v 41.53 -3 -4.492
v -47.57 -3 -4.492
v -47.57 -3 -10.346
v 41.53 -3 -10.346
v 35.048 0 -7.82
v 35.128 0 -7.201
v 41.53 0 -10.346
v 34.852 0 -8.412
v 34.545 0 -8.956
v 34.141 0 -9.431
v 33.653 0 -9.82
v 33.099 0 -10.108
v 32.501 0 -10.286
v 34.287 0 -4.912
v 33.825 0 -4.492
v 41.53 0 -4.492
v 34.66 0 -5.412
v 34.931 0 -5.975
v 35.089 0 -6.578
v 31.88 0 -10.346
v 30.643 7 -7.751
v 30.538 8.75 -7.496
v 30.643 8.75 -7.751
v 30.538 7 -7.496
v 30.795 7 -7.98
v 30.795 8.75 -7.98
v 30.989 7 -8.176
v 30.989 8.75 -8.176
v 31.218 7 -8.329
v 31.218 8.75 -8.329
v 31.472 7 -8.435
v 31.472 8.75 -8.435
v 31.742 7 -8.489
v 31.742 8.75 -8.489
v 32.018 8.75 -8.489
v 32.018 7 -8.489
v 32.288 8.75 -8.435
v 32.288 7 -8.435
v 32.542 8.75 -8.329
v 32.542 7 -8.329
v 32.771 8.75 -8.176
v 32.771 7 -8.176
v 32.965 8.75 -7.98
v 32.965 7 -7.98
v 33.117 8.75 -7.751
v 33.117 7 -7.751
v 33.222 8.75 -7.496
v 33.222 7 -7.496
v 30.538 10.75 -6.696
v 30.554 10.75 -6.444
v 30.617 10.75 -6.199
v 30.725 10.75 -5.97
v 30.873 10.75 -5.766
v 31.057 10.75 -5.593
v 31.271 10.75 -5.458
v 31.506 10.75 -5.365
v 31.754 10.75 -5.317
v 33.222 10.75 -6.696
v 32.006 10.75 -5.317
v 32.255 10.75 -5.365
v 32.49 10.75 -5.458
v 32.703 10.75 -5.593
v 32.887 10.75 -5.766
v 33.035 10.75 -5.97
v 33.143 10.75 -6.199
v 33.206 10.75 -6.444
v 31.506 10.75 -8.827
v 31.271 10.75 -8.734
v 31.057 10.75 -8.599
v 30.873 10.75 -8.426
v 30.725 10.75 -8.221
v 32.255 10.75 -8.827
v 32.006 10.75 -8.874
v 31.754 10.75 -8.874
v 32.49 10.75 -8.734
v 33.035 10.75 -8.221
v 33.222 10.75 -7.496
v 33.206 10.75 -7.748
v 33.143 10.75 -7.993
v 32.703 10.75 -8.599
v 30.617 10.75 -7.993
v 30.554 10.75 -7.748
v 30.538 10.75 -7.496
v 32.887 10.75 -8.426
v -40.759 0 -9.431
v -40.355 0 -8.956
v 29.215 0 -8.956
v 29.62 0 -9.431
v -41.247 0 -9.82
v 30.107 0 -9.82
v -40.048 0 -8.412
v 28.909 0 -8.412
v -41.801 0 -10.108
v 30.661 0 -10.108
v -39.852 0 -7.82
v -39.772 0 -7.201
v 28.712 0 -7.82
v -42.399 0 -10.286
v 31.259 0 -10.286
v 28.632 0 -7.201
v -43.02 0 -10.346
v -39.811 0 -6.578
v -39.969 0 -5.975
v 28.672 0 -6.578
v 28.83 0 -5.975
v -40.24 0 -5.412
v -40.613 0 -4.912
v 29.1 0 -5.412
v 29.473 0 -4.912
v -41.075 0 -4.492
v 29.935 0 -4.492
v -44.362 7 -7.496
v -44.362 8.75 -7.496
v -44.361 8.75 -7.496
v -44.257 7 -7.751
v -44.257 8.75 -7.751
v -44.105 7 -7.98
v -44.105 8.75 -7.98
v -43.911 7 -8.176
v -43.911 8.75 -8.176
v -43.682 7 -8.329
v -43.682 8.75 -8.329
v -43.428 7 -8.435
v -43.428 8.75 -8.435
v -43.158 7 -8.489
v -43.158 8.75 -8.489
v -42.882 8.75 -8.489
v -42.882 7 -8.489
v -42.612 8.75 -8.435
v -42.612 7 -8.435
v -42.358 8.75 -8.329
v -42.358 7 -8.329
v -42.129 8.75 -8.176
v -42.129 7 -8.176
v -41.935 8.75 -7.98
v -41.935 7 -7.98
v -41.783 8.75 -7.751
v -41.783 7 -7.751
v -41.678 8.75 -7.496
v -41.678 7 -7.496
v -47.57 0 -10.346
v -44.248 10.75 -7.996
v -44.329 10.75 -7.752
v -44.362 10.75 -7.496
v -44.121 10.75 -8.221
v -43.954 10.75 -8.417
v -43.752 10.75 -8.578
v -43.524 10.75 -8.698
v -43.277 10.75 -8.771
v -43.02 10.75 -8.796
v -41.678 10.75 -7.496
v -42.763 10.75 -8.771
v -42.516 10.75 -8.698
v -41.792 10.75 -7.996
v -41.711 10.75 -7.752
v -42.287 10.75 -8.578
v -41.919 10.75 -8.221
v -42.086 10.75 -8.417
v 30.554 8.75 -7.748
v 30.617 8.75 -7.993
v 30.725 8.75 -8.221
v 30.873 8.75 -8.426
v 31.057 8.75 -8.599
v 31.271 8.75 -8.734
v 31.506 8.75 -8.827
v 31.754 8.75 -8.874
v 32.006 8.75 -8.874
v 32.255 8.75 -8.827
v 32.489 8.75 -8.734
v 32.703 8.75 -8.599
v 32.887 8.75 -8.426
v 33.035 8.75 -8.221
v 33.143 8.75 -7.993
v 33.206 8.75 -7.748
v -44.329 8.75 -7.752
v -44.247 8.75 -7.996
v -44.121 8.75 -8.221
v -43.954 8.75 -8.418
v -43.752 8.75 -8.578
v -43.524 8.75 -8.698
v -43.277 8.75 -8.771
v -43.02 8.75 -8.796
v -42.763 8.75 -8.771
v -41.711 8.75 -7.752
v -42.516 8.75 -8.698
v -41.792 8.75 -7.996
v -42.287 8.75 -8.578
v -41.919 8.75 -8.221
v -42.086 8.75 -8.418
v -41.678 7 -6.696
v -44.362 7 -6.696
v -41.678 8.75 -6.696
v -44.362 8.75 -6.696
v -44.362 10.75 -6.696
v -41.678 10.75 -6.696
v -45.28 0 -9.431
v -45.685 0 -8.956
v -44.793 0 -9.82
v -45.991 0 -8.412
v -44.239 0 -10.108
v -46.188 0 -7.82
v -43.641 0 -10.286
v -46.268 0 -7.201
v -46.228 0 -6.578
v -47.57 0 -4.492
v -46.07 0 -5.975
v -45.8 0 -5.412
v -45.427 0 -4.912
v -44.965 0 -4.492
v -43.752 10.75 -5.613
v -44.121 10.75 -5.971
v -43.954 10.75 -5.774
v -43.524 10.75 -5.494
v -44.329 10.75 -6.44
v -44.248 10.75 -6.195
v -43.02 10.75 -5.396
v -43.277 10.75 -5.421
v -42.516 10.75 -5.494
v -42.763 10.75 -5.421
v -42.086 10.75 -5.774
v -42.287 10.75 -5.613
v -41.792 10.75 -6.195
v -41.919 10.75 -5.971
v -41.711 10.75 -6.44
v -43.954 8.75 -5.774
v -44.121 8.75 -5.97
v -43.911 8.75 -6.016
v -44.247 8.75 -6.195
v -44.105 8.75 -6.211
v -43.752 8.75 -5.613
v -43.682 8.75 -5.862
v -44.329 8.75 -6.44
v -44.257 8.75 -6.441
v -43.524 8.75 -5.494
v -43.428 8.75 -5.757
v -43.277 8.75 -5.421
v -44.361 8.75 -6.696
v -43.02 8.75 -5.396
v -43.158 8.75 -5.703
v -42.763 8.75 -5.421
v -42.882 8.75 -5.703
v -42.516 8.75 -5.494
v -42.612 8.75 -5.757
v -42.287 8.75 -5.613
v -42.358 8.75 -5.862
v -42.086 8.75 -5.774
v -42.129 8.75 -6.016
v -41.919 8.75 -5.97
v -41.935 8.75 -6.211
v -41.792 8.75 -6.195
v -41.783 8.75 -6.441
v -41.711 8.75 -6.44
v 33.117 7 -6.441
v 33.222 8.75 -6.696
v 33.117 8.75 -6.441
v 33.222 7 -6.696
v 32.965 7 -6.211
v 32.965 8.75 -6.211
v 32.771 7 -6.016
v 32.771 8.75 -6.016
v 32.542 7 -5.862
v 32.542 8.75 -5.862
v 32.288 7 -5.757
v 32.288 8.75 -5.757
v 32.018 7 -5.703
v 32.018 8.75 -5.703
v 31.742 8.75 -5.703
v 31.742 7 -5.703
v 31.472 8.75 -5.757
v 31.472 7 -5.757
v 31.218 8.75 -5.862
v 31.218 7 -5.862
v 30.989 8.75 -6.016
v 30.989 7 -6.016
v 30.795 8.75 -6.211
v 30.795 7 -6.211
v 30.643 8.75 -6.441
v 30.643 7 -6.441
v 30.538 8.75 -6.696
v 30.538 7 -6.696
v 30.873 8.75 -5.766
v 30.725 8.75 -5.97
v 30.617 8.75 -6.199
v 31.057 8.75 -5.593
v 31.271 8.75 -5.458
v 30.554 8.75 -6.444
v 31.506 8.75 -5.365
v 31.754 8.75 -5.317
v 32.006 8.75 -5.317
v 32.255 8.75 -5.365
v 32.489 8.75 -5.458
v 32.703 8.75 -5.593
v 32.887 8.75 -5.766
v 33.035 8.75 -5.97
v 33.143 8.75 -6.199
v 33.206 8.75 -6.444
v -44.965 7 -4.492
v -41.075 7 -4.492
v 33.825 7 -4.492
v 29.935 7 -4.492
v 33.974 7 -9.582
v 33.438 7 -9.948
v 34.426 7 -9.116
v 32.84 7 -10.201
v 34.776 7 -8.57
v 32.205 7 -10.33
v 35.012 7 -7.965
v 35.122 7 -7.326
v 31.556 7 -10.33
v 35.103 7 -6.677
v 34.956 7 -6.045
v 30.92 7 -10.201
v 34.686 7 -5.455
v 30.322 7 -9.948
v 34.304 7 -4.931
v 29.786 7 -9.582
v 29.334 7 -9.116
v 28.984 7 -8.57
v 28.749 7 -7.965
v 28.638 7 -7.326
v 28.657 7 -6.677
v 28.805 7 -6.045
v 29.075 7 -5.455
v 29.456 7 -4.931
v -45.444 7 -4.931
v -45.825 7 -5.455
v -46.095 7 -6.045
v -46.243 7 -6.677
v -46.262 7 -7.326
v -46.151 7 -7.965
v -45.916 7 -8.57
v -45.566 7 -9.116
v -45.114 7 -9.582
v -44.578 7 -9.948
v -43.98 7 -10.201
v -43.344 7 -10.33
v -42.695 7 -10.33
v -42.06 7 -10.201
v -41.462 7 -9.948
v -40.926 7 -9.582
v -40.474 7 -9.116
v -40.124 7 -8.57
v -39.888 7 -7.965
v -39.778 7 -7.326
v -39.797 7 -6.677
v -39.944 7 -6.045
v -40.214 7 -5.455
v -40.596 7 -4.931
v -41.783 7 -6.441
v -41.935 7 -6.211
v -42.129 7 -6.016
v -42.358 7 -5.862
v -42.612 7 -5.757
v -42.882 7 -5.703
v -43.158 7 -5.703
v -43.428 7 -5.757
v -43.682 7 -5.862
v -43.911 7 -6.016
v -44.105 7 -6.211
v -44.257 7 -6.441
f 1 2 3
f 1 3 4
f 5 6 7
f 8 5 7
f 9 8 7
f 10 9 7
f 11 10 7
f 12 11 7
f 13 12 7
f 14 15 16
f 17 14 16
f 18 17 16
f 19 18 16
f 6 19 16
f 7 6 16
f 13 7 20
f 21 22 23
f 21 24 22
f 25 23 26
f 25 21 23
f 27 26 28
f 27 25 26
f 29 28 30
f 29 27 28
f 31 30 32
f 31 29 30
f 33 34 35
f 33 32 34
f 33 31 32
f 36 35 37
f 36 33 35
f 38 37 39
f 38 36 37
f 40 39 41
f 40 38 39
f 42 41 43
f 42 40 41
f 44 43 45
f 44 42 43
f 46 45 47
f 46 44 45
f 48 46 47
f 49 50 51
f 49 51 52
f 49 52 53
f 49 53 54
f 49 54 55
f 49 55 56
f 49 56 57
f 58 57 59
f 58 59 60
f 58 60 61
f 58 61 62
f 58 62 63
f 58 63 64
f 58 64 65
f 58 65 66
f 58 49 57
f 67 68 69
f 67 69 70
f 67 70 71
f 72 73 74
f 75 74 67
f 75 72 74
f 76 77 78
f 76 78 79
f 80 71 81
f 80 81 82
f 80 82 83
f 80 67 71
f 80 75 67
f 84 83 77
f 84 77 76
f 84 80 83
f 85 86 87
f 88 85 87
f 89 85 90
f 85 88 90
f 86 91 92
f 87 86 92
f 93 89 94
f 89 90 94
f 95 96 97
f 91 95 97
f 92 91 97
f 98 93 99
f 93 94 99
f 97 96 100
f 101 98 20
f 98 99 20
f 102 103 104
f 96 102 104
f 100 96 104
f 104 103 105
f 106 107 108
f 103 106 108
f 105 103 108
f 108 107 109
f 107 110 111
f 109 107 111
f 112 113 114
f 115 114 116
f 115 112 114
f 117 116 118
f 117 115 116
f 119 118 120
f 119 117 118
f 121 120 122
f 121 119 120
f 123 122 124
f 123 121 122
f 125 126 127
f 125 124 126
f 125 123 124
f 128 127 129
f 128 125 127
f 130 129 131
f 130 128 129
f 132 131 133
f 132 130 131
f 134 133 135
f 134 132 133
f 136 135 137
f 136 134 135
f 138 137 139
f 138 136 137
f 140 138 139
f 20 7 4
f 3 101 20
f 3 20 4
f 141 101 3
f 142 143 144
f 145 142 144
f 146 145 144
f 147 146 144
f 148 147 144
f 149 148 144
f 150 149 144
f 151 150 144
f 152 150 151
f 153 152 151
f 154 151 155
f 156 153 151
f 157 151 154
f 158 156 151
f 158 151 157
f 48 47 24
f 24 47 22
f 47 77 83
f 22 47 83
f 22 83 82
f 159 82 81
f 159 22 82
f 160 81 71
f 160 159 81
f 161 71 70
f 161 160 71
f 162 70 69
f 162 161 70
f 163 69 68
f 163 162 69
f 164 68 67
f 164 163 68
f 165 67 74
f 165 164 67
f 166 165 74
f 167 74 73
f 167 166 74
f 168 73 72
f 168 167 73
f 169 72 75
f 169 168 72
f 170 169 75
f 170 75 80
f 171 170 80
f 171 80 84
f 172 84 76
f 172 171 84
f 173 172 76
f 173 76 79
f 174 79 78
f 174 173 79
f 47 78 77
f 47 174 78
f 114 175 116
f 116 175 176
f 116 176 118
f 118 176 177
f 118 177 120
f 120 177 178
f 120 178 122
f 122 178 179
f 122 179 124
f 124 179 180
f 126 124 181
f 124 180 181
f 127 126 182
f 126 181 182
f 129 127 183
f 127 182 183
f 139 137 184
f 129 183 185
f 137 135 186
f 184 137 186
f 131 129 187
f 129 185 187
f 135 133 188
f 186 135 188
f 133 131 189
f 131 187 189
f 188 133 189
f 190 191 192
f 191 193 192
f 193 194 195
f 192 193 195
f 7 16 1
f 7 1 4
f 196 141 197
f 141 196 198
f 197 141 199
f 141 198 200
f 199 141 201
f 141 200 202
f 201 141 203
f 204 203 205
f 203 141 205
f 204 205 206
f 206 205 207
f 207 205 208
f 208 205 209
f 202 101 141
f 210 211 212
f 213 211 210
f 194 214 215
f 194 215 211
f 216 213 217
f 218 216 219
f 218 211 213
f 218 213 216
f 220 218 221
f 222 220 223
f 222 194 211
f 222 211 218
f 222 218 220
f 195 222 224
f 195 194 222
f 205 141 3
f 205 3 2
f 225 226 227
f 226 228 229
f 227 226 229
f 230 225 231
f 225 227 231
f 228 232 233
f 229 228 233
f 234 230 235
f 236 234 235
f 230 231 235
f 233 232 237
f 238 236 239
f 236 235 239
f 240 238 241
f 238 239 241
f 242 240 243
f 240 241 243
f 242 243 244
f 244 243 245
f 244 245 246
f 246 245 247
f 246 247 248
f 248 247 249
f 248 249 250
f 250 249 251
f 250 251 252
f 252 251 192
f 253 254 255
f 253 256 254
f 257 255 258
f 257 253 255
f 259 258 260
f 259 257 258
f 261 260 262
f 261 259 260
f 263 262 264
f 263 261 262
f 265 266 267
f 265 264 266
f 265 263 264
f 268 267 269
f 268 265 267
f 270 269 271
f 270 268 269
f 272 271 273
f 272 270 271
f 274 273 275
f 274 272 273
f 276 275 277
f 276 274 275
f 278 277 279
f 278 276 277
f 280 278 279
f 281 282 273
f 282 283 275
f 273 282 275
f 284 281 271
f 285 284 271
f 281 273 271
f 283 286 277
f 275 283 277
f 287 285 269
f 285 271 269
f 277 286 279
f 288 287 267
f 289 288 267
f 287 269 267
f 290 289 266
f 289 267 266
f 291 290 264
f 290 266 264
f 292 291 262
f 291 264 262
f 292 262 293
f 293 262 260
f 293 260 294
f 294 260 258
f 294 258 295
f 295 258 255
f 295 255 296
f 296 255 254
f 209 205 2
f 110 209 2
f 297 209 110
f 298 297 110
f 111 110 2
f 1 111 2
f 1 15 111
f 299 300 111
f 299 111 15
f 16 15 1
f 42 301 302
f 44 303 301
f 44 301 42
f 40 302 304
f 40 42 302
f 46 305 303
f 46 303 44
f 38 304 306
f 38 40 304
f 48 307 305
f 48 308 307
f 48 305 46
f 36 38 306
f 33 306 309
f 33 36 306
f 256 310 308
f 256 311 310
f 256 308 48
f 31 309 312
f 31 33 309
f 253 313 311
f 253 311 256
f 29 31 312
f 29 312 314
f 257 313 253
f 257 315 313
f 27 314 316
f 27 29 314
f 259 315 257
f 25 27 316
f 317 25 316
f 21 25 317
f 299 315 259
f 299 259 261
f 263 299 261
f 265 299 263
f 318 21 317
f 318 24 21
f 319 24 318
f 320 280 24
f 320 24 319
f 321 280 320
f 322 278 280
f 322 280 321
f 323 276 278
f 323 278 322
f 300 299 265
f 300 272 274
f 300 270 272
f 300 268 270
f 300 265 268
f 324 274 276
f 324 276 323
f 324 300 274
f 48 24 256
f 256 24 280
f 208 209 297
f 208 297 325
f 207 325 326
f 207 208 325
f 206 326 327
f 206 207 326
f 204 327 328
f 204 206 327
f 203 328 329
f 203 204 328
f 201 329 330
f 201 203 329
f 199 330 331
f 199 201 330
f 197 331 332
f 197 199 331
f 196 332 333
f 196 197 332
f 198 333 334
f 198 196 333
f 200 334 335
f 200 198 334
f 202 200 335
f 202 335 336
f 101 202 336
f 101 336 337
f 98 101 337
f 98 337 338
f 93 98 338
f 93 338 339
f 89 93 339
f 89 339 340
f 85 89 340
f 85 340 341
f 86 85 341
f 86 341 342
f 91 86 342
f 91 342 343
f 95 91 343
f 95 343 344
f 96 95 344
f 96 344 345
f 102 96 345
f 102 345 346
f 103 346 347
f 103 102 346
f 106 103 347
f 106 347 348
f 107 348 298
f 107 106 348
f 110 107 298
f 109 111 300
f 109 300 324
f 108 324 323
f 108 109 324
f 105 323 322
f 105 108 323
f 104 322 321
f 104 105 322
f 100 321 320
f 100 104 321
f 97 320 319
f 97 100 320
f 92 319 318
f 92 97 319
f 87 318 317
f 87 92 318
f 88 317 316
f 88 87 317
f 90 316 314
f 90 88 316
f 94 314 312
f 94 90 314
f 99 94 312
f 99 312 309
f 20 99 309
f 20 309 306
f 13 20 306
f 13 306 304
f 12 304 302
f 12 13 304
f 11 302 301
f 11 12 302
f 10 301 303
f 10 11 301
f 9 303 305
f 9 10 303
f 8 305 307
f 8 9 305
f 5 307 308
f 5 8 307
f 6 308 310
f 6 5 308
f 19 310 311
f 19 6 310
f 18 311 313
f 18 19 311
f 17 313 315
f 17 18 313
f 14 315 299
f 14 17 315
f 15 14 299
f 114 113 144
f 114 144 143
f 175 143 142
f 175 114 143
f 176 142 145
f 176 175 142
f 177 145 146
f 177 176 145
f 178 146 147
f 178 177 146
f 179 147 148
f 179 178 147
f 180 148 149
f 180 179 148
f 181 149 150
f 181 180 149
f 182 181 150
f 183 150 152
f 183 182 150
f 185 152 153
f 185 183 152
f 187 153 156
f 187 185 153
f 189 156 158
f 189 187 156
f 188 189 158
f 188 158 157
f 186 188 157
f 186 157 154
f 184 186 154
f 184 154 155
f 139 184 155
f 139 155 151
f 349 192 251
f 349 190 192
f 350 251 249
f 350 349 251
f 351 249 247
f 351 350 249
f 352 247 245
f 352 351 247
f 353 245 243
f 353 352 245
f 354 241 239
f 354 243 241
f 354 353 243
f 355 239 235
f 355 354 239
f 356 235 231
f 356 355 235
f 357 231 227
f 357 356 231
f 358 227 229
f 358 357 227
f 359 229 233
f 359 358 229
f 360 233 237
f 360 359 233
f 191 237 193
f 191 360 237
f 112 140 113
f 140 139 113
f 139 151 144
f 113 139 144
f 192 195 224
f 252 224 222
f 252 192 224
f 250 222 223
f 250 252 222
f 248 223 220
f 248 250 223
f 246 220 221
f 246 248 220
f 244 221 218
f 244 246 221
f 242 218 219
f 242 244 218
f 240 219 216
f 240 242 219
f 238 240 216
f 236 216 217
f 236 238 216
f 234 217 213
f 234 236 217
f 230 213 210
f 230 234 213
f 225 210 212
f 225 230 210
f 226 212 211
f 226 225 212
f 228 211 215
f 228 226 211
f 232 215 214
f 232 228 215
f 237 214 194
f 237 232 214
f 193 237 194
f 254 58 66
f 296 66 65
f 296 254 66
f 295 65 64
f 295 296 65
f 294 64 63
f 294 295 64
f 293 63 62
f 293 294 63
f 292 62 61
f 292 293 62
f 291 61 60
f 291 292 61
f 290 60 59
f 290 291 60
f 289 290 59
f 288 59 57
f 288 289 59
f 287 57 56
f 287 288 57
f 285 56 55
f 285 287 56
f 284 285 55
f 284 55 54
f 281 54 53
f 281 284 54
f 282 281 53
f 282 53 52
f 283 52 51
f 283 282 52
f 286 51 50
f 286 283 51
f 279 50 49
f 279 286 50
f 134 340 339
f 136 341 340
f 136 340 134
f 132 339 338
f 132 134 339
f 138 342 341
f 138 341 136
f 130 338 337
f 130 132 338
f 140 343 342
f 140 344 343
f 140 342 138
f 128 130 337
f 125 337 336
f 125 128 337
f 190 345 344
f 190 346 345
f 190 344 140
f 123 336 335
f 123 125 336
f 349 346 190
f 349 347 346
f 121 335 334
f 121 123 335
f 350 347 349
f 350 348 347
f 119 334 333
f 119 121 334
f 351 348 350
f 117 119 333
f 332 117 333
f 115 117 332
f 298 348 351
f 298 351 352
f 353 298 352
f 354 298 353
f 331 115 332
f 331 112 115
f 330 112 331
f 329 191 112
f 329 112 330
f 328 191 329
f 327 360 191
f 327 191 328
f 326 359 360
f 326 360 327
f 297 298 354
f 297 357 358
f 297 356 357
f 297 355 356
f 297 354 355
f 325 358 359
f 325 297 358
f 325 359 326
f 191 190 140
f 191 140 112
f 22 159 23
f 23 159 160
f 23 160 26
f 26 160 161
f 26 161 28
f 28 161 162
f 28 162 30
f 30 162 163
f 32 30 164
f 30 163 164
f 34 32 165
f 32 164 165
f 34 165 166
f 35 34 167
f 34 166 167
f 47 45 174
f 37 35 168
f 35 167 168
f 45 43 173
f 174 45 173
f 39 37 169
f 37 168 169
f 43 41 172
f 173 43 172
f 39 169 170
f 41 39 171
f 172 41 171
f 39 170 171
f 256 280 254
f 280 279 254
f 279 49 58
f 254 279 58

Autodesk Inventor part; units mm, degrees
ref_plane "YZ Plane" through (0, 0, 0) normal (1, 0, 0) x (0, 1, 0)
ref_plane "XZ Plane" through (0, 0, 0) normal (0, 1, 0) x (-1, 0, 0)
ref_plane "XY Plane" through (0, 0, 0) normal (0, 0, 1) x (1, 0, 0)
sketch "Sketch1" plane through (0, 0, 0) normal (0, 1, 0) x (-1, 0, 0)
  circle A0 centre (43.0199, -7.0958) radius 1.25 construction
  circle A1 centre (-31.8801, -7.0958) radius 1.25 construction
  circle A2 centre (44.3199, 41.1042) radius 1.25 construction
  circle A3 centre (-38.2801, 41.1042) radius 1.25 construction
  line L0 (58.8879, -10.055) -> (-40.7911, -10.055) construction
  line L1 (-40.7911, -10.055) -> (-40.7911, 44.0634) construction
  line L2 (-40.7911, 44.0634) -> (58.8879, 44.0634) construction
  line L3 (58.8879, 44.0634) -> (58.8879, -10.055) construction
  line L4 (43.0199, -7.0958) -> (43.0199, -10.055)
  line L5 (44.3199, 41.1042) -> (44.3199, 44.0634)
  dimension "d0" = 2.5
  dimension "d1" = 74.9
  dimension "d2" = 1.3
  dimension "d3" = 48.2
  dimension "d5" = 82.6
  dimension "d9" = 15.868
  dimension "d10" = 54.1184
  dimension "d11" = 99.679
sketch "Sketch2" plane through (0, 0, 0) normal (0, 1, 0) x (-1, 0, 0)
  circle A0 centre (43.0199, -7.0958) radius 1.25 construction
  circle A1 centre (-31.8801, -7.0958) radius 1.25 construction
  circle A2 centre (-38.2801, 41.1042) radius 1.25 construction
  circle A3 centre (44.3199, 41.1042) radius 1.25 construction
  circle A4 centre (43.0199, -7.0958) radius 3.25
  circle A5 centre (-31.8801, -7.0958) radius 3.25
  circle A6 centre (-38.2801, 41.1042) radius 3.25
  circle A7 centre (44.3199, 41.1042) radius 3.25
  point P0 (0, 0)
  dimension "d6" = 2
extrude "Extrusion1" add sketch "Sketch2" along normal blind 7
sketch "Sketch3" plane through (-43.0199, 7, -7.0958) normal (0, 1, 0) x (1, 0, 0)
  circle A0 centre (0, 0) radius 3.25 projected
  circle A1 centre (74.9, 0) radius 3.25 projected
  circle A2 centre (81.3, -48.2) radius 3.25 projected
  circle A3 centre (-1.3, -48.2) radius 3.25 projected
  point P0 (43.0199, -7.0958)
hole "Hole1" at (-43.0199, 7, -7.0958) at (31.8801, 7, -7.0958) at (38.2801, 7, 41.1042) at (-44.3199, 7, 41.1042) direction (0, -1, 0) diameter 3.75 depth 4
chamfer "Chamfer1" distance 0.2 angle 45 4 edges at (-44.3199, 7, 39.2292) (38.2801, 7, 39.2292) (31.8801, 7, -8.9708) (-43.0199, 7, -8.9708)
sketch "Sketch4" plane through (-44.3199, 0, 41.1042) normal (0, -1, 0) x (1, 0, 0)
  line L0 (-3.25, 3.25) -> (85.85, 3.25)
  line L1 (85.85, 3.25) -> (85.85, -51.45)
  line L2 (85.85, -51.45) -> (-3.25, -51.45)
  line L3 (-3.25, -51.45) -> (-3.25, 3.25)
  circle A0 centre (0, 0) radius 3.25 projected
  circle A1 centre (76.2, -48.2) radius 3.25 projected
  circle A2 centre (82.6, 0) radius 3.25 projected
  point P0 (44.3199, -41.1042)
  point P1 (-3.25, 0)
  point P2 (85.85, 0)
  point P3 (82.6, 3.25)
  point P4 (0, 3.25)
extrude "Extrusion2" add sketch "Sketch4" along normal blind 3 contours A1 | L0 A2 L1 L2 L3 A0 | A0 | A2
sketch "Sketch5" plane through (-44.3199, 0, 41.1042) normal (0, 1, 0) x (1, 0, 0)
  circle A0 centre (1.3, 48.2) radius 3.25 projected
  line L0 (3.2453, 45.5965) -> (74.2547, 45.5965)
  line L1 (74.2547, 45.5965) -> (74.2547, 0.1746)
  line L2 (74.2547, 0.1746) -> (3.2453, 0.1746)
  line L3 (3.2453, 0.1746) -> (3.2453, 45.5965)
  circle A1 centre (76.2, 48.2) radius 3.25 projected
  circle A2 centre (0, 0) radius 3.25 projected
  point P0 (44.3199, 41.1042)
extrude "Extrusion3" cut sketch "Sketch5" against normal blind 3 contours L0 L1 L2 L3
sketch "Sketch6" plane through (31.8801, 7, -7.0958) normal (0, 1, 0) x (1, 0, 0)
  circle A0 centre (-74.9, 0) radius 1.875 projected
  circle A1 centre (-74.9, 0) radius 2.075
  circle A2 centre (0, 0) radius 2.075
  point P0 (-31.8801, -7.0958)
extrude "Extrusion4" add sketch "Sketch6" against normal up to surface (7 mm away) contours A0 | A1 | A2
sketch "Sketch7" plane through (31.8801, 7, -7.0958) normal (0, 1, 0) x (1, 0, 0)
  circle A0 centre (0, 0) radius 1.4
  circle A1 centre (-74.9, 0) radius 3.25 projected
  circle A2 centre (-74.9, 0) radius 1.4
  point P0 (-31.8801, -7.0958)
  dimension "d28" = 2.8
extrude "Extrusion5" add sketch "Sketch7" along normal blind 1.75 contours A0 | A2
sketch "Sketch11" plane through (-43.0199, 8.75, -7.0958) normal (0, 1, 0) x (1, 0, 0)
  line L0 (76.3, 0.4) -> (73.5, 0.4)
  line L1 (73.5, 0.4) -> (73.5, -0.4)
  line L2 (73.5, -0.4) -> (76.3, -0.4)
  line L3 (76.3, -0.4) -> (76.3, 0.4)
  circle A0 centre (74.9, 0) radius 3.25 projected
  line L4 (76.3, 0.4) -> (73.5, -0.4) construction
  line L5 (73.5, 0.4) -> (76.3, -0.4) construction
  circle A1 centre (74.9, 0) radius 1.4 projected
  line L6 (1.4, 0.4) -> (-1.4, 0.4)
  line L7 (-1.4, 0.4) -> (-1.4, -0.4)
  line L8 (-1.4, -0.4) -> (1.4, -0.4)
  line L9 (1.4, -0.4) -> (1.4, 0.4)
  circle A2 centre (0, 0) radius 3.25 projected
  line L10 (1.4, 0.4) -> (-1.4, -0.4) construction
  line L11 (-1.4, 0.4) -> (1.4, -0.4) construction
  circle A3 centre (0, 0) radius 1.4 projected
  point P0 (43.0199, -7.0958)
  point P1 (76.2416, -0.4)
  point P2 (76.2416, 0.4)
  point P3 (73.5584, 0.4)
  point P4 (73.5584, -0.4)
  dimension "d41" = 1
  dimension "d42" = 1
extrude "Extrusion8" cut sketch "Sketch11" against normal up to surface (1.75 mm away) contours A1 L2 L0 | L9 A3 L6 | A3 L8 L6 | L9 L8 A3 | A3 L7 L6 | A3 L8 L7
sketch "Sketch12" plane through (31.8801, 8.75, -7.0958) normal (0, 1, 0) x (1, 0, 0)
  line L0 (1.3416, -0.4) -> (-1.3416, -0.4) projected
  arc A0 (-1.3416, -0.4) -> (1.3416, -0.4) centre (0, -0.4423) ccw
  arc A1 (1.3416, 0.4) -> (-1.3416, 0.4) centre (0, 0) ccw projected
  line L1 (-1.3416, 0.4) -> (1.3416, 0.4) projected
  arc A2 (1.3416, 0.4) -> (-1.3416, 0.4) centre (0, 0.4423) ccw
  arc A3 (-76.2416, -0.4) -> (-73.5584, -0.4) centre (-74.9, 0) ccw projected
  arc A4 (-76.2416, -0.4) -> (-73.5584, -0.4) centre (-74.9, -0.3577) ccw
  arc A5 (-73.5584, 0.4) -> (-76.2416, 0.4) centre (-74.9, 0) ccw projected
  arc A6 (-73.5584, 0.4) -> (-76.2416, 0.4) centre (-74.9, 0.3577) ccw
  line L2 (-73.5584, -0.4) -> (-76.2416, -0.4) projected
  line L3 (-76.2416, 0.4) -> (-73.5584, 0.4) projected
  point P0 (-31.8801, -7.0958)
  point P1 (-1.0724, 0.9)
  point P2 (1.0724, 0.9)
  dimension "d45" = 0.3
extrude "Extrusion9" add sketch "Sketch12" along normal blind 2
sketch "Sketch13" plane through (-44.3199, 0, 44.3542) normal (0, 0, 1) x (1, 0, 0)
  line L0 (-3.25, -3) -> (0, -3) projected
  line L1 (85.85, 7) -> (79.35, 7) projected
  line L2 (-3.25, -3) -> (85.85, -3)
  line L3 (85.85, -3) -> (85.85, 7)
  line L4 (85.85, 7) -> (-3.25, 7)
  line L5 (-3.25, 7) -> (-3.25, -3)
  point P0 (44.3199, 0)
extrude "Extrusion10" cut sketch "Sketch13" against normal up to surface (48.8465 mm away)
properties part number "arduino_mega_standoffs_test_clip"
